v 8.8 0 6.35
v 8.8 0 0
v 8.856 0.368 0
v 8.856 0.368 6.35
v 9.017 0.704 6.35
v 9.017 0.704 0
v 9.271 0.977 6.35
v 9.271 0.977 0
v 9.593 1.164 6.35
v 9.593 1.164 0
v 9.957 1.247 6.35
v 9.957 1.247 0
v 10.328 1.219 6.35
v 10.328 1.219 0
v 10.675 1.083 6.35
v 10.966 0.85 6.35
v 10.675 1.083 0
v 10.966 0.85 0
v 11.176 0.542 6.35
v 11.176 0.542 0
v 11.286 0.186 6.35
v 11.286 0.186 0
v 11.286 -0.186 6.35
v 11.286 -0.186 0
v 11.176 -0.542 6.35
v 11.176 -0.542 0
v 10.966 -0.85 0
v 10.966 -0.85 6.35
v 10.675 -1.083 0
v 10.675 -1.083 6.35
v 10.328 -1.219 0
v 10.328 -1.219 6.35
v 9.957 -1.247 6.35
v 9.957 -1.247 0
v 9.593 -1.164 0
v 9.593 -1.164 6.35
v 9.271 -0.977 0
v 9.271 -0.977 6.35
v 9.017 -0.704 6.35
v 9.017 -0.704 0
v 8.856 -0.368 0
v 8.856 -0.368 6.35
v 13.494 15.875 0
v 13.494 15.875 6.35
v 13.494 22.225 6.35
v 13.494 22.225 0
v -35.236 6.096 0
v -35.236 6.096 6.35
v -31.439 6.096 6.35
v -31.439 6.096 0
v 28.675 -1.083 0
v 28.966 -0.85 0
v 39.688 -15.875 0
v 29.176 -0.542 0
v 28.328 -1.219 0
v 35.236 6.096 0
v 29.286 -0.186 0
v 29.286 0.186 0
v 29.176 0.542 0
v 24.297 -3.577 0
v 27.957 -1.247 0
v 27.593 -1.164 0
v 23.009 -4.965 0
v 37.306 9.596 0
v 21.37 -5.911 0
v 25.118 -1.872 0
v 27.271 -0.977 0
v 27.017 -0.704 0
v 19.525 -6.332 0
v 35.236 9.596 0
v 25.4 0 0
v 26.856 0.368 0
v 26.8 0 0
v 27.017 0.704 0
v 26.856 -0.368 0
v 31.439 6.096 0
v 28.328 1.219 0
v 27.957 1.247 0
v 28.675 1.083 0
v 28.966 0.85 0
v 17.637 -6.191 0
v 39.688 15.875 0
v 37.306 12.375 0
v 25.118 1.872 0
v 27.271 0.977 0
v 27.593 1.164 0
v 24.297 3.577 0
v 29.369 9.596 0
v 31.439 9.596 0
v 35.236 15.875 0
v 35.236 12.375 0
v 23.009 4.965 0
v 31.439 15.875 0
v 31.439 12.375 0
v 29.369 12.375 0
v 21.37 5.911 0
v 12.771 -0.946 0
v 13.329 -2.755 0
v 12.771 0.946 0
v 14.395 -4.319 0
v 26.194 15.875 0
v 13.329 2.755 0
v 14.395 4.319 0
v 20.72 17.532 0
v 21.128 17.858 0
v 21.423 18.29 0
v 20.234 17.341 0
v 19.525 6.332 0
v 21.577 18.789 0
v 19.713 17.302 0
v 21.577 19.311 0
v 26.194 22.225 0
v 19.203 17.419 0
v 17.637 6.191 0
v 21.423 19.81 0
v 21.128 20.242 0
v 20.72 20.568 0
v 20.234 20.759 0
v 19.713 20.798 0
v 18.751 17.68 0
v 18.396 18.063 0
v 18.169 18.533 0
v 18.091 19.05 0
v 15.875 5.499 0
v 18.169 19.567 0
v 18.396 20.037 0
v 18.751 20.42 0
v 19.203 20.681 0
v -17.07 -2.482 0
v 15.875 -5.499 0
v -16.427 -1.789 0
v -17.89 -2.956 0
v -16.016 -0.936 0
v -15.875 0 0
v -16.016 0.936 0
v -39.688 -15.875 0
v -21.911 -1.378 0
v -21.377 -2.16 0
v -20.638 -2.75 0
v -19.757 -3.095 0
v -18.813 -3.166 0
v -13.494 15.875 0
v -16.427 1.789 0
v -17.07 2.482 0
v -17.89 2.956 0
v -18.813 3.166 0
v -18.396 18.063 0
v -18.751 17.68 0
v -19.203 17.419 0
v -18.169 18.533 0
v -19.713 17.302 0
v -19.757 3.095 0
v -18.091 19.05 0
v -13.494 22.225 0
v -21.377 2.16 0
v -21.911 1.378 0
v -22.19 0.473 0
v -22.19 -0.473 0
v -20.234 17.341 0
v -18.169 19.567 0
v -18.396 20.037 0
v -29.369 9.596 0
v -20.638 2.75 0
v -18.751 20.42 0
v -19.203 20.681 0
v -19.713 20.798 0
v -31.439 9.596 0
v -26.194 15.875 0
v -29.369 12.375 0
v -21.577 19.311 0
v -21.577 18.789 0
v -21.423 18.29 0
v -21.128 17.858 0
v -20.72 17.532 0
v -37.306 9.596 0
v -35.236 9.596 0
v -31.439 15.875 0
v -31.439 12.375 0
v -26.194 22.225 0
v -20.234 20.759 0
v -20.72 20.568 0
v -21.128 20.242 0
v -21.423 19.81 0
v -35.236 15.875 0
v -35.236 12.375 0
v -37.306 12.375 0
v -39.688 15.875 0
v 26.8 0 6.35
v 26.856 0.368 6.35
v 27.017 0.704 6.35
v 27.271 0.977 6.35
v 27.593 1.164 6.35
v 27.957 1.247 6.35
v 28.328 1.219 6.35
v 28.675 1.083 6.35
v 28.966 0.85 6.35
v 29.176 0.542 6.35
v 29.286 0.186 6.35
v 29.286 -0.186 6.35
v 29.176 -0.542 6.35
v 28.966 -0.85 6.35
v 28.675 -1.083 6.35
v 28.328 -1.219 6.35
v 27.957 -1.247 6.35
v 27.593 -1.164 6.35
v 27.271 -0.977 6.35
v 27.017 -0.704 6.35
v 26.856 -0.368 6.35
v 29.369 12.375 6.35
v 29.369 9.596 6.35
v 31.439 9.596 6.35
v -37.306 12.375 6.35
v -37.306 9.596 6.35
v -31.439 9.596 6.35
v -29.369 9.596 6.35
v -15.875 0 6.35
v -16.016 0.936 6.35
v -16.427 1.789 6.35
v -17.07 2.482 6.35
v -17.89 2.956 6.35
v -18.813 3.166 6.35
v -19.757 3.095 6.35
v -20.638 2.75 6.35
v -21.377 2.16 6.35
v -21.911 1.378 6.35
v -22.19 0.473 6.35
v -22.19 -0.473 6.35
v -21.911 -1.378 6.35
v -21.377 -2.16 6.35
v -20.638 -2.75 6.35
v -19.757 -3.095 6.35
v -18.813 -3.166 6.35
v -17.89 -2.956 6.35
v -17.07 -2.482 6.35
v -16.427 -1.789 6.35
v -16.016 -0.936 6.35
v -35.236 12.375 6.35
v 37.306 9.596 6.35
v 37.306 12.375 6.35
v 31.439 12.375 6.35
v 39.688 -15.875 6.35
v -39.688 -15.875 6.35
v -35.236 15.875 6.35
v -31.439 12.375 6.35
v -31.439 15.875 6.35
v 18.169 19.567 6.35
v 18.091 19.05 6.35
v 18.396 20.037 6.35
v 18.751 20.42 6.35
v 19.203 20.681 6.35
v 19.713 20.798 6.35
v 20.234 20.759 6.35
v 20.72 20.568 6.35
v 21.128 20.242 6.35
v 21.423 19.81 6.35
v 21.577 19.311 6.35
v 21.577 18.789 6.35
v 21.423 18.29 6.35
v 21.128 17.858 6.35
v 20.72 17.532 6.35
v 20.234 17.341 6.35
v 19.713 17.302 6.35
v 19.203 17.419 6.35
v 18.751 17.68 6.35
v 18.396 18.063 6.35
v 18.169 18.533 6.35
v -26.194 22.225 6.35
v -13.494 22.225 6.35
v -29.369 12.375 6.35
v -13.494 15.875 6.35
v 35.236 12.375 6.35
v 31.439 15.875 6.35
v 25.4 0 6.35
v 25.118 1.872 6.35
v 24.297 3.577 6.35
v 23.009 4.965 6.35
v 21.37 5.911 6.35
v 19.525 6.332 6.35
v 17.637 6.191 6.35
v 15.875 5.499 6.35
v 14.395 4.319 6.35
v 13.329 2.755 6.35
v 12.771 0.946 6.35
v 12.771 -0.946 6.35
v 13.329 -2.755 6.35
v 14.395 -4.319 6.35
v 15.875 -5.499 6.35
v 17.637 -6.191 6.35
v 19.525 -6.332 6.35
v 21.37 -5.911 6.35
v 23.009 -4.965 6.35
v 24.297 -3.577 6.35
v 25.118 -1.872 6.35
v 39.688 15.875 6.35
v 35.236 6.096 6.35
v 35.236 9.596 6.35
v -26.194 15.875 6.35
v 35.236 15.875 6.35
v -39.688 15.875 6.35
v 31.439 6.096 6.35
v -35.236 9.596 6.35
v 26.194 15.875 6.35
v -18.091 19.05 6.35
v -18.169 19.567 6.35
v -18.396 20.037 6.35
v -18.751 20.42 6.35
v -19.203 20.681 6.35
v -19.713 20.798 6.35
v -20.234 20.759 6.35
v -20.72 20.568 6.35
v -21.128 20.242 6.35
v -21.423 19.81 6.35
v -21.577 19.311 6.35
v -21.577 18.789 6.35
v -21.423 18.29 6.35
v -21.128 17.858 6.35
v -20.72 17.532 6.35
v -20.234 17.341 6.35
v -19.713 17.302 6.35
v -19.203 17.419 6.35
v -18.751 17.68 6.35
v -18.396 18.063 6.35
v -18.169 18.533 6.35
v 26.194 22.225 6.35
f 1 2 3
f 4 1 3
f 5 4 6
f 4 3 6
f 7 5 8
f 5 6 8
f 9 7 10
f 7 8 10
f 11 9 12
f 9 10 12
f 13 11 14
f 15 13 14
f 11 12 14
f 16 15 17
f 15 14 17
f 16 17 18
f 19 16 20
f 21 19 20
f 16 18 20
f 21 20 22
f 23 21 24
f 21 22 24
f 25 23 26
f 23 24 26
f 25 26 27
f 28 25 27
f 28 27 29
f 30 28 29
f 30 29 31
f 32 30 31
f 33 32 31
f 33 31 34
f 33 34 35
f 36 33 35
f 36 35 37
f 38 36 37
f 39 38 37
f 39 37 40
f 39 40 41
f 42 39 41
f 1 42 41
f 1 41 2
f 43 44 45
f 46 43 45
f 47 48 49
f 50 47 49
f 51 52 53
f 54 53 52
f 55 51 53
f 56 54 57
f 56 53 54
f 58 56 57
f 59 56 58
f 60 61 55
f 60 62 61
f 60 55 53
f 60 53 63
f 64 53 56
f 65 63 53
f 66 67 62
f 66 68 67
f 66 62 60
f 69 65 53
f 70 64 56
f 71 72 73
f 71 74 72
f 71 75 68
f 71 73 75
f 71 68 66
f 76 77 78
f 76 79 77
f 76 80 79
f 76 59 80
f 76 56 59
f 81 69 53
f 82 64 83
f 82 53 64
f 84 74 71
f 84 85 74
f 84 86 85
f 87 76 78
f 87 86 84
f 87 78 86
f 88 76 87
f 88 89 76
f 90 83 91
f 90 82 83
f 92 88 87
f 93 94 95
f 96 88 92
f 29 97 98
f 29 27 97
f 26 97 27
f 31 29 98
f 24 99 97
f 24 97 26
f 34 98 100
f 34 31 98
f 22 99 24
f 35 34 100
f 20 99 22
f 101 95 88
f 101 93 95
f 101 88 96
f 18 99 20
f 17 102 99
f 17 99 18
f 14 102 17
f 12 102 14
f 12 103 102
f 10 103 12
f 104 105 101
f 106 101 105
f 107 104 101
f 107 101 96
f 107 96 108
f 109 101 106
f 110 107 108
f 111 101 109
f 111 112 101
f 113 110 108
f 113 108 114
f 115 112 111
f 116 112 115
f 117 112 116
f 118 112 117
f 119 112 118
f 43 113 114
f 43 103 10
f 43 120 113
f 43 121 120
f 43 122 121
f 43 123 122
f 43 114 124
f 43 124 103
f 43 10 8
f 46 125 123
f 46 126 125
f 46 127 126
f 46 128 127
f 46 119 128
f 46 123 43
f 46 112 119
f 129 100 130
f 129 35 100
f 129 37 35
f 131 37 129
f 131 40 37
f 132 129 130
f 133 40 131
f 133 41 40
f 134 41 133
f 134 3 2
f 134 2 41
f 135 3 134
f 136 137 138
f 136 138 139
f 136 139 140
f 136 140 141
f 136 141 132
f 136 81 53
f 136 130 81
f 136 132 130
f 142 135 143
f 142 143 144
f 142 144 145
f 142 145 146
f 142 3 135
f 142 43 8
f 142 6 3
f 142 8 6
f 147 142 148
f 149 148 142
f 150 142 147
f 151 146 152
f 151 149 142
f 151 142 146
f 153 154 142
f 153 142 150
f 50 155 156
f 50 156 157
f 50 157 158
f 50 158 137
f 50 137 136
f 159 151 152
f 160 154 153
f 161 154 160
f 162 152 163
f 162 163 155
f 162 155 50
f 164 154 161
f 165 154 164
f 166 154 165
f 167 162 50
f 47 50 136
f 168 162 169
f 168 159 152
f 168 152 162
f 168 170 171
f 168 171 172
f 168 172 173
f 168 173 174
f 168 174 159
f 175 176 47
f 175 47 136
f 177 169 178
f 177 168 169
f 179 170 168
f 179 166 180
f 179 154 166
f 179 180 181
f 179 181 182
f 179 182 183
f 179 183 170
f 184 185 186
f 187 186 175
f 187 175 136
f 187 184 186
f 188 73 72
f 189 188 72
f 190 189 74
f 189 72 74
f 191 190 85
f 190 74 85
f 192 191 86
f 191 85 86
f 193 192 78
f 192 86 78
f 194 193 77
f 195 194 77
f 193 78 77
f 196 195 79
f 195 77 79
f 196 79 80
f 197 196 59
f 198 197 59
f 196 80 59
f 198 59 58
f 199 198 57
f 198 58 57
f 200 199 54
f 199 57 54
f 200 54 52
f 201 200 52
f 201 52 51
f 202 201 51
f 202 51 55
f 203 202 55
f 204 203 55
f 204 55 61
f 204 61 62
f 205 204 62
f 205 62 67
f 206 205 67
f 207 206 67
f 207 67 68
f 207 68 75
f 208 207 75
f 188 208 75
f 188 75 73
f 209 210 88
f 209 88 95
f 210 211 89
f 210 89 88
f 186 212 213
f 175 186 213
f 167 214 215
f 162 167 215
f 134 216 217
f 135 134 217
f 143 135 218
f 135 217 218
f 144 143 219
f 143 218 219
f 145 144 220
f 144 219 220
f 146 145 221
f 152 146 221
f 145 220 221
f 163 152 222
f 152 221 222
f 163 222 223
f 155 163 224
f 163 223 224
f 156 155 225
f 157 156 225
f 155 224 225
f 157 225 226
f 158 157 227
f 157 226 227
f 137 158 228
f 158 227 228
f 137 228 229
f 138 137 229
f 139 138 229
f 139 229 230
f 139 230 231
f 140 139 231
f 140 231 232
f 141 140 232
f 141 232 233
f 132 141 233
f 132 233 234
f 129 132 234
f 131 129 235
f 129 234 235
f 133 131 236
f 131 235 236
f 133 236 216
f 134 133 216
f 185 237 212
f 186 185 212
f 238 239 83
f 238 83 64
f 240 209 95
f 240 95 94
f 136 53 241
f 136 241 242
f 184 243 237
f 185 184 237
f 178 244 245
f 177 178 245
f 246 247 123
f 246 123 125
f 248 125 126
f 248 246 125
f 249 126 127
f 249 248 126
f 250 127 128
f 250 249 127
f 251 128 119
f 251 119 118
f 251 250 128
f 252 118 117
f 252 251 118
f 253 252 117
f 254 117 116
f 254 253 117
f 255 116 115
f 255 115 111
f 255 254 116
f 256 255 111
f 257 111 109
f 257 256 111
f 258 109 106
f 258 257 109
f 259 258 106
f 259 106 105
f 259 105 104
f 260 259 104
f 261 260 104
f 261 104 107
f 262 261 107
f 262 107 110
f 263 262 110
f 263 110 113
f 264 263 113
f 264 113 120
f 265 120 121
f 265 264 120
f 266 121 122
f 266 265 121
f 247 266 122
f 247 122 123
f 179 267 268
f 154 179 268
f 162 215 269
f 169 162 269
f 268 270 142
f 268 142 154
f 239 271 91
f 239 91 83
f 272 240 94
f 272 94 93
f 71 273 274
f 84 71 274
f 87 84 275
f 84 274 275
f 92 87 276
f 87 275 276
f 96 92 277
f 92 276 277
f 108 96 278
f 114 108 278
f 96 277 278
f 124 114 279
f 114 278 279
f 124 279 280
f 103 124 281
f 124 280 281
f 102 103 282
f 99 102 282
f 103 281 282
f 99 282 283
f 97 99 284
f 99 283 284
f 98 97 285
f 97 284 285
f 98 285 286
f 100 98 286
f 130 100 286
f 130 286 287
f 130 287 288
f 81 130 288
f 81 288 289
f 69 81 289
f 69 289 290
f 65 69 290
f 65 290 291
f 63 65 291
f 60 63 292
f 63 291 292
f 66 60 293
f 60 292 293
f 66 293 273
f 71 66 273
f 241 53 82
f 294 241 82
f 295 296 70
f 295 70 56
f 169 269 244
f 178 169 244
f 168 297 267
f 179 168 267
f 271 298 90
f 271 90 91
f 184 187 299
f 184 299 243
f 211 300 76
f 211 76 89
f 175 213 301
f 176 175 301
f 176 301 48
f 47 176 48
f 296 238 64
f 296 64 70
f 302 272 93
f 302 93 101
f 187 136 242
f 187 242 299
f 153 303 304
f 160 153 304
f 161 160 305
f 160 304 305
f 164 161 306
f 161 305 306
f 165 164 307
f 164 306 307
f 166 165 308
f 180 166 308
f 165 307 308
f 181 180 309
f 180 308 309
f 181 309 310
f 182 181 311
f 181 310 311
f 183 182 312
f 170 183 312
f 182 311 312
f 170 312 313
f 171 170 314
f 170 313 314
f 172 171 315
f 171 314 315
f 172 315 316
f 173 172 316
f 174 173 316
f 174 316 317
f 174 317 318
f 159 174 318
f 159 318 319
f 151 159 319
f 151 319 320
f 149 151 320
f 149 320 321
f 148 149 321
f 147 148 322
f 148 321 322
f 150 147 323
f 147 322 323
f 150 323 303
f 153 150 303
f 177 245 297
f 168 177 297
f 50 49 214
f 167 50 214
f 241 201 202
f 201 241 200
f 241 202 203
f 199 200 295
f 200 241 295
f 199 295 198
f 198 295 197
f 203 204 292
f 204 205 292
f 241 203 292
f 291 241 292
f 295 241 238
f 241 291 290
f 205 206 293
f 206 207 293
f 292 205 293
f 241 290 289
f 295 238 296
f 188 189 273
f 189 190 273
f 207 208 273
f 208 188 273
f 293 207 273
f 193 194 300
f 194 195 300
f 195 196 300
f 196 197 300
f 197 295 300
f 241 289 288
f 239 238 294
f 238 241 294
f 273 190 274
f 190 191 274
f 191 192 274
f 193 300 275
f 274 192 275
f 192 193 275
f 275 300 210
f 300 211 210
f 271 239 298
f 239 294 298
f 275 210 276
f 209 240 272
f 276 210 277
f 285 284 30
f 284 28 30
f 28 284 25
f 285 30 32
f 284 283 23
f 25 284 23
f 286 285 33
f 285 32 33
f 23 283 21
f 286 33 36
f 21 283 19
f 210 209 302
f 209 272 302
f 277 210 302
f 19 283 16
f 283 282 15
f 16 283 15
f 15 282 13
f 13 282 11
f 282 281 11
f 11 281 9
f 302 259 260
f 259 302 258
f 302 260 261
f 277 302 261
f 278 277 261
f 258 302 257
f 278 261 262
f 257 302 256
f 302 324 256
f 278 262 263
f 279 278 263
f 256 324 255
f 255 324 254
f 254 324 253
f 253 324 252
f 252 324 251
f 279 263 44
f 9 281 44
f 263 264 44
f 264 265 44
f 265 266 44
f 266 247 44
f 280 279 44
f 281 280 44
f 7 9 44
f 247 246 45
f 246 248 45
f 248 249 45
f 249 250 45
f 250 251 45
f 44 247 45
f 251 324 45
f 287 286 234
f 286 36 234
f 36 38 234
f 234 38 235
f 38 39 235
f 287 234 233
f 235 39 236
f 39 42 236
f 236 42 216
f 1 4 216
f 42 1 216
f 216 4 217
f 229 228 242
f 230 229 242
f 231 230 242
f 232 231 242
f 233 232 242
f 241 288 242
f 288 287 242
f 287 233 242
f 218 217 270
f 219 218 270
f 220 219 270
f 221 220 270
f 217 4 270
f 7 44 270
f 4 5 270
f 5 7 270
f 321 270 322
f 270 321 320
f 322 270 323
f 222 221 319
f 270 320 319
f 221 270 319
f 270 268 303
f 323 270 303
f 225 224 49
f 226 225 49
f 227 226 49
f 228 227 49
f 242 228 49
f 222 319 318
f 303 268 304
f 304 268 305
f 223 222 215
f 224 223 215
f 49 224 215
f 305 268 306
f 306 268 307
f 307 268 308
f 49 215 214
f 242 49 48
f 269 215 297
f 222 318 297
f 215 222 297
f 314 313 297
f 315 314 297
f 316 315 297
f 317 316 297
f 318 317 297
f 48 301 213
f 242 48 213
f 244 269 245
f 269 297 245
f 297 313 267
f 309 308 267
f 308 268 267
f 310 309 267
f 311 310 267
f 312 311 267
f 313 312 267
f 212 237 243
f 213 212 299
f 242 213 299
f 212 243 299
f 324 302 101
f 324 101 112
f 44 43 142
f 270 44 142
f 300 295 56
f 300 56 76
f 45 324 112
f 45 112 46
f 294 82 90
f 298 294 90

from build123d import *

# Parameters (mm, degrees)
SKETCH1_W                   = 39.6875
SKETCH1_H                   = 31.75
BOSS_EXTRUDE1_DEPTH         = 6.35
SKETCH2_R                   = 3.175
CUT_EXTRUDE1_DEPTH          = 6.35
CUT_EXTRUDE4_DEPTH          = 6.35
SKETCH4_W                   = 12.7
SKETCH4_H                   = 6.35
SKETCH4_R                   = 1.7526
BOSS_EXTRUDE2_DEPTH         = 6.35
SKETCH5_R                   = 6.35
CUT_EXTRUDE3_DEPTH          = 6.35
TAP_DRILL_FOR_M3X0_5_TAP1_D = 2.5


with BuildPart() as part:
    # Sketch1 → Boss-Extrude1 (new body)
    with BuildSketch(Plane.XY):
        with Locations((-19.84375, 0)):
            Rectangle(SKETCH1_W, SKETCH1_H)
    boss_extrude1 = extrude(amount=BOSS_EXTRUDE1_DEPTH)

    # Sketch2 → Cut-Extrude1 (cut)
    with BuildSketch(Plane.XY.offset(6.35)):
        with Locations((-19.05, 0)):
            Circle(SKETCH2_R)
    extrude(amount=-CUT_EXTRUDE1_DEPTH, mode=Mode.SUBTRACT)

    # Sketch3 → Cut-Extrude4 (cut)
    with BuildSketch(Plane.XY.offset(6.35)):
        Polygon((-35.23615, 6.096), (-31.43885, 6.096), (-31.43885, 9.5964375), (-29.36875, 9.5964375), (-29.36875, 12.3745625), (-31.43885, 12.3745625), (-31.43885, 15.875), (-35.23615, 15.875), (-35.23615, 12.3745625), (-37.30625, 12.3745625), (-37.30625, 9.5964375), (-35.23615, 9.5964375), align=None)
    cut_extrude4 = extrude(amount=-CUT_EXTRUDE4_DEPTH, mode=Mode.SUBTRACT)

    # Sketch4 → Boss-Extrude2 (add)
    with BuildSketch(Plane.XY.offset(6.35)):
        with Locations((-19.84375, 19.05)):
            Rectangle(SKETCH4_W, SKETCH4_H)
        with Locations((-19.84375, 19.05)):
            Circle(SKETCH4_R, mode=Mode.SUBTRACT)
    boss_extrude2 = extrude(amount=-BOSS_EXTRUDE2_DEPTH)

    # Mirror1: Boss-Extrude1, Cut-Extrude4, Boss-Extrude2 across plane
    add(boss_extrude1.mirror(Plane(origin=(0, -15.875, 6.35), x_dir=(0, 0, 1), z_dir=(-1, 0, 0))))
    add(cut_extrude4.mirror(Plane(origin=(0, -15.875, 6.35), x_dir=(0, 0, 1), z_dir=(-1, 0, 0))), mode=Mode.SUBTRACT)
    add(boss_extrude2.mirror(Plane(origin=(0, -15.875, 6.35), x_dir=(0, 0, 1), z_dir=(-1, 0, 0))))

    # Sketch5 → Cut-Extrude3 (cut)
    with BuildSketch(Plane.XY.offset(6.35)):
        with Locations((19.05, 0)):
            Circle(SKETCH5_R)
    extrude(amount=-CUT_EXTRUDE3_DEPTH, mode=Mode.SUBTRACT)

    # Tap Drill for M3x0.5 Tap1 (through all)
    with Locations(Plane.XY.offset(6.35)):
        with Locations((28.05, 0), (10.05, 0)):
            Hole(TAP_DRILL_FOR_M3X0_5_TAP1_D / 2)


solid = part.part
